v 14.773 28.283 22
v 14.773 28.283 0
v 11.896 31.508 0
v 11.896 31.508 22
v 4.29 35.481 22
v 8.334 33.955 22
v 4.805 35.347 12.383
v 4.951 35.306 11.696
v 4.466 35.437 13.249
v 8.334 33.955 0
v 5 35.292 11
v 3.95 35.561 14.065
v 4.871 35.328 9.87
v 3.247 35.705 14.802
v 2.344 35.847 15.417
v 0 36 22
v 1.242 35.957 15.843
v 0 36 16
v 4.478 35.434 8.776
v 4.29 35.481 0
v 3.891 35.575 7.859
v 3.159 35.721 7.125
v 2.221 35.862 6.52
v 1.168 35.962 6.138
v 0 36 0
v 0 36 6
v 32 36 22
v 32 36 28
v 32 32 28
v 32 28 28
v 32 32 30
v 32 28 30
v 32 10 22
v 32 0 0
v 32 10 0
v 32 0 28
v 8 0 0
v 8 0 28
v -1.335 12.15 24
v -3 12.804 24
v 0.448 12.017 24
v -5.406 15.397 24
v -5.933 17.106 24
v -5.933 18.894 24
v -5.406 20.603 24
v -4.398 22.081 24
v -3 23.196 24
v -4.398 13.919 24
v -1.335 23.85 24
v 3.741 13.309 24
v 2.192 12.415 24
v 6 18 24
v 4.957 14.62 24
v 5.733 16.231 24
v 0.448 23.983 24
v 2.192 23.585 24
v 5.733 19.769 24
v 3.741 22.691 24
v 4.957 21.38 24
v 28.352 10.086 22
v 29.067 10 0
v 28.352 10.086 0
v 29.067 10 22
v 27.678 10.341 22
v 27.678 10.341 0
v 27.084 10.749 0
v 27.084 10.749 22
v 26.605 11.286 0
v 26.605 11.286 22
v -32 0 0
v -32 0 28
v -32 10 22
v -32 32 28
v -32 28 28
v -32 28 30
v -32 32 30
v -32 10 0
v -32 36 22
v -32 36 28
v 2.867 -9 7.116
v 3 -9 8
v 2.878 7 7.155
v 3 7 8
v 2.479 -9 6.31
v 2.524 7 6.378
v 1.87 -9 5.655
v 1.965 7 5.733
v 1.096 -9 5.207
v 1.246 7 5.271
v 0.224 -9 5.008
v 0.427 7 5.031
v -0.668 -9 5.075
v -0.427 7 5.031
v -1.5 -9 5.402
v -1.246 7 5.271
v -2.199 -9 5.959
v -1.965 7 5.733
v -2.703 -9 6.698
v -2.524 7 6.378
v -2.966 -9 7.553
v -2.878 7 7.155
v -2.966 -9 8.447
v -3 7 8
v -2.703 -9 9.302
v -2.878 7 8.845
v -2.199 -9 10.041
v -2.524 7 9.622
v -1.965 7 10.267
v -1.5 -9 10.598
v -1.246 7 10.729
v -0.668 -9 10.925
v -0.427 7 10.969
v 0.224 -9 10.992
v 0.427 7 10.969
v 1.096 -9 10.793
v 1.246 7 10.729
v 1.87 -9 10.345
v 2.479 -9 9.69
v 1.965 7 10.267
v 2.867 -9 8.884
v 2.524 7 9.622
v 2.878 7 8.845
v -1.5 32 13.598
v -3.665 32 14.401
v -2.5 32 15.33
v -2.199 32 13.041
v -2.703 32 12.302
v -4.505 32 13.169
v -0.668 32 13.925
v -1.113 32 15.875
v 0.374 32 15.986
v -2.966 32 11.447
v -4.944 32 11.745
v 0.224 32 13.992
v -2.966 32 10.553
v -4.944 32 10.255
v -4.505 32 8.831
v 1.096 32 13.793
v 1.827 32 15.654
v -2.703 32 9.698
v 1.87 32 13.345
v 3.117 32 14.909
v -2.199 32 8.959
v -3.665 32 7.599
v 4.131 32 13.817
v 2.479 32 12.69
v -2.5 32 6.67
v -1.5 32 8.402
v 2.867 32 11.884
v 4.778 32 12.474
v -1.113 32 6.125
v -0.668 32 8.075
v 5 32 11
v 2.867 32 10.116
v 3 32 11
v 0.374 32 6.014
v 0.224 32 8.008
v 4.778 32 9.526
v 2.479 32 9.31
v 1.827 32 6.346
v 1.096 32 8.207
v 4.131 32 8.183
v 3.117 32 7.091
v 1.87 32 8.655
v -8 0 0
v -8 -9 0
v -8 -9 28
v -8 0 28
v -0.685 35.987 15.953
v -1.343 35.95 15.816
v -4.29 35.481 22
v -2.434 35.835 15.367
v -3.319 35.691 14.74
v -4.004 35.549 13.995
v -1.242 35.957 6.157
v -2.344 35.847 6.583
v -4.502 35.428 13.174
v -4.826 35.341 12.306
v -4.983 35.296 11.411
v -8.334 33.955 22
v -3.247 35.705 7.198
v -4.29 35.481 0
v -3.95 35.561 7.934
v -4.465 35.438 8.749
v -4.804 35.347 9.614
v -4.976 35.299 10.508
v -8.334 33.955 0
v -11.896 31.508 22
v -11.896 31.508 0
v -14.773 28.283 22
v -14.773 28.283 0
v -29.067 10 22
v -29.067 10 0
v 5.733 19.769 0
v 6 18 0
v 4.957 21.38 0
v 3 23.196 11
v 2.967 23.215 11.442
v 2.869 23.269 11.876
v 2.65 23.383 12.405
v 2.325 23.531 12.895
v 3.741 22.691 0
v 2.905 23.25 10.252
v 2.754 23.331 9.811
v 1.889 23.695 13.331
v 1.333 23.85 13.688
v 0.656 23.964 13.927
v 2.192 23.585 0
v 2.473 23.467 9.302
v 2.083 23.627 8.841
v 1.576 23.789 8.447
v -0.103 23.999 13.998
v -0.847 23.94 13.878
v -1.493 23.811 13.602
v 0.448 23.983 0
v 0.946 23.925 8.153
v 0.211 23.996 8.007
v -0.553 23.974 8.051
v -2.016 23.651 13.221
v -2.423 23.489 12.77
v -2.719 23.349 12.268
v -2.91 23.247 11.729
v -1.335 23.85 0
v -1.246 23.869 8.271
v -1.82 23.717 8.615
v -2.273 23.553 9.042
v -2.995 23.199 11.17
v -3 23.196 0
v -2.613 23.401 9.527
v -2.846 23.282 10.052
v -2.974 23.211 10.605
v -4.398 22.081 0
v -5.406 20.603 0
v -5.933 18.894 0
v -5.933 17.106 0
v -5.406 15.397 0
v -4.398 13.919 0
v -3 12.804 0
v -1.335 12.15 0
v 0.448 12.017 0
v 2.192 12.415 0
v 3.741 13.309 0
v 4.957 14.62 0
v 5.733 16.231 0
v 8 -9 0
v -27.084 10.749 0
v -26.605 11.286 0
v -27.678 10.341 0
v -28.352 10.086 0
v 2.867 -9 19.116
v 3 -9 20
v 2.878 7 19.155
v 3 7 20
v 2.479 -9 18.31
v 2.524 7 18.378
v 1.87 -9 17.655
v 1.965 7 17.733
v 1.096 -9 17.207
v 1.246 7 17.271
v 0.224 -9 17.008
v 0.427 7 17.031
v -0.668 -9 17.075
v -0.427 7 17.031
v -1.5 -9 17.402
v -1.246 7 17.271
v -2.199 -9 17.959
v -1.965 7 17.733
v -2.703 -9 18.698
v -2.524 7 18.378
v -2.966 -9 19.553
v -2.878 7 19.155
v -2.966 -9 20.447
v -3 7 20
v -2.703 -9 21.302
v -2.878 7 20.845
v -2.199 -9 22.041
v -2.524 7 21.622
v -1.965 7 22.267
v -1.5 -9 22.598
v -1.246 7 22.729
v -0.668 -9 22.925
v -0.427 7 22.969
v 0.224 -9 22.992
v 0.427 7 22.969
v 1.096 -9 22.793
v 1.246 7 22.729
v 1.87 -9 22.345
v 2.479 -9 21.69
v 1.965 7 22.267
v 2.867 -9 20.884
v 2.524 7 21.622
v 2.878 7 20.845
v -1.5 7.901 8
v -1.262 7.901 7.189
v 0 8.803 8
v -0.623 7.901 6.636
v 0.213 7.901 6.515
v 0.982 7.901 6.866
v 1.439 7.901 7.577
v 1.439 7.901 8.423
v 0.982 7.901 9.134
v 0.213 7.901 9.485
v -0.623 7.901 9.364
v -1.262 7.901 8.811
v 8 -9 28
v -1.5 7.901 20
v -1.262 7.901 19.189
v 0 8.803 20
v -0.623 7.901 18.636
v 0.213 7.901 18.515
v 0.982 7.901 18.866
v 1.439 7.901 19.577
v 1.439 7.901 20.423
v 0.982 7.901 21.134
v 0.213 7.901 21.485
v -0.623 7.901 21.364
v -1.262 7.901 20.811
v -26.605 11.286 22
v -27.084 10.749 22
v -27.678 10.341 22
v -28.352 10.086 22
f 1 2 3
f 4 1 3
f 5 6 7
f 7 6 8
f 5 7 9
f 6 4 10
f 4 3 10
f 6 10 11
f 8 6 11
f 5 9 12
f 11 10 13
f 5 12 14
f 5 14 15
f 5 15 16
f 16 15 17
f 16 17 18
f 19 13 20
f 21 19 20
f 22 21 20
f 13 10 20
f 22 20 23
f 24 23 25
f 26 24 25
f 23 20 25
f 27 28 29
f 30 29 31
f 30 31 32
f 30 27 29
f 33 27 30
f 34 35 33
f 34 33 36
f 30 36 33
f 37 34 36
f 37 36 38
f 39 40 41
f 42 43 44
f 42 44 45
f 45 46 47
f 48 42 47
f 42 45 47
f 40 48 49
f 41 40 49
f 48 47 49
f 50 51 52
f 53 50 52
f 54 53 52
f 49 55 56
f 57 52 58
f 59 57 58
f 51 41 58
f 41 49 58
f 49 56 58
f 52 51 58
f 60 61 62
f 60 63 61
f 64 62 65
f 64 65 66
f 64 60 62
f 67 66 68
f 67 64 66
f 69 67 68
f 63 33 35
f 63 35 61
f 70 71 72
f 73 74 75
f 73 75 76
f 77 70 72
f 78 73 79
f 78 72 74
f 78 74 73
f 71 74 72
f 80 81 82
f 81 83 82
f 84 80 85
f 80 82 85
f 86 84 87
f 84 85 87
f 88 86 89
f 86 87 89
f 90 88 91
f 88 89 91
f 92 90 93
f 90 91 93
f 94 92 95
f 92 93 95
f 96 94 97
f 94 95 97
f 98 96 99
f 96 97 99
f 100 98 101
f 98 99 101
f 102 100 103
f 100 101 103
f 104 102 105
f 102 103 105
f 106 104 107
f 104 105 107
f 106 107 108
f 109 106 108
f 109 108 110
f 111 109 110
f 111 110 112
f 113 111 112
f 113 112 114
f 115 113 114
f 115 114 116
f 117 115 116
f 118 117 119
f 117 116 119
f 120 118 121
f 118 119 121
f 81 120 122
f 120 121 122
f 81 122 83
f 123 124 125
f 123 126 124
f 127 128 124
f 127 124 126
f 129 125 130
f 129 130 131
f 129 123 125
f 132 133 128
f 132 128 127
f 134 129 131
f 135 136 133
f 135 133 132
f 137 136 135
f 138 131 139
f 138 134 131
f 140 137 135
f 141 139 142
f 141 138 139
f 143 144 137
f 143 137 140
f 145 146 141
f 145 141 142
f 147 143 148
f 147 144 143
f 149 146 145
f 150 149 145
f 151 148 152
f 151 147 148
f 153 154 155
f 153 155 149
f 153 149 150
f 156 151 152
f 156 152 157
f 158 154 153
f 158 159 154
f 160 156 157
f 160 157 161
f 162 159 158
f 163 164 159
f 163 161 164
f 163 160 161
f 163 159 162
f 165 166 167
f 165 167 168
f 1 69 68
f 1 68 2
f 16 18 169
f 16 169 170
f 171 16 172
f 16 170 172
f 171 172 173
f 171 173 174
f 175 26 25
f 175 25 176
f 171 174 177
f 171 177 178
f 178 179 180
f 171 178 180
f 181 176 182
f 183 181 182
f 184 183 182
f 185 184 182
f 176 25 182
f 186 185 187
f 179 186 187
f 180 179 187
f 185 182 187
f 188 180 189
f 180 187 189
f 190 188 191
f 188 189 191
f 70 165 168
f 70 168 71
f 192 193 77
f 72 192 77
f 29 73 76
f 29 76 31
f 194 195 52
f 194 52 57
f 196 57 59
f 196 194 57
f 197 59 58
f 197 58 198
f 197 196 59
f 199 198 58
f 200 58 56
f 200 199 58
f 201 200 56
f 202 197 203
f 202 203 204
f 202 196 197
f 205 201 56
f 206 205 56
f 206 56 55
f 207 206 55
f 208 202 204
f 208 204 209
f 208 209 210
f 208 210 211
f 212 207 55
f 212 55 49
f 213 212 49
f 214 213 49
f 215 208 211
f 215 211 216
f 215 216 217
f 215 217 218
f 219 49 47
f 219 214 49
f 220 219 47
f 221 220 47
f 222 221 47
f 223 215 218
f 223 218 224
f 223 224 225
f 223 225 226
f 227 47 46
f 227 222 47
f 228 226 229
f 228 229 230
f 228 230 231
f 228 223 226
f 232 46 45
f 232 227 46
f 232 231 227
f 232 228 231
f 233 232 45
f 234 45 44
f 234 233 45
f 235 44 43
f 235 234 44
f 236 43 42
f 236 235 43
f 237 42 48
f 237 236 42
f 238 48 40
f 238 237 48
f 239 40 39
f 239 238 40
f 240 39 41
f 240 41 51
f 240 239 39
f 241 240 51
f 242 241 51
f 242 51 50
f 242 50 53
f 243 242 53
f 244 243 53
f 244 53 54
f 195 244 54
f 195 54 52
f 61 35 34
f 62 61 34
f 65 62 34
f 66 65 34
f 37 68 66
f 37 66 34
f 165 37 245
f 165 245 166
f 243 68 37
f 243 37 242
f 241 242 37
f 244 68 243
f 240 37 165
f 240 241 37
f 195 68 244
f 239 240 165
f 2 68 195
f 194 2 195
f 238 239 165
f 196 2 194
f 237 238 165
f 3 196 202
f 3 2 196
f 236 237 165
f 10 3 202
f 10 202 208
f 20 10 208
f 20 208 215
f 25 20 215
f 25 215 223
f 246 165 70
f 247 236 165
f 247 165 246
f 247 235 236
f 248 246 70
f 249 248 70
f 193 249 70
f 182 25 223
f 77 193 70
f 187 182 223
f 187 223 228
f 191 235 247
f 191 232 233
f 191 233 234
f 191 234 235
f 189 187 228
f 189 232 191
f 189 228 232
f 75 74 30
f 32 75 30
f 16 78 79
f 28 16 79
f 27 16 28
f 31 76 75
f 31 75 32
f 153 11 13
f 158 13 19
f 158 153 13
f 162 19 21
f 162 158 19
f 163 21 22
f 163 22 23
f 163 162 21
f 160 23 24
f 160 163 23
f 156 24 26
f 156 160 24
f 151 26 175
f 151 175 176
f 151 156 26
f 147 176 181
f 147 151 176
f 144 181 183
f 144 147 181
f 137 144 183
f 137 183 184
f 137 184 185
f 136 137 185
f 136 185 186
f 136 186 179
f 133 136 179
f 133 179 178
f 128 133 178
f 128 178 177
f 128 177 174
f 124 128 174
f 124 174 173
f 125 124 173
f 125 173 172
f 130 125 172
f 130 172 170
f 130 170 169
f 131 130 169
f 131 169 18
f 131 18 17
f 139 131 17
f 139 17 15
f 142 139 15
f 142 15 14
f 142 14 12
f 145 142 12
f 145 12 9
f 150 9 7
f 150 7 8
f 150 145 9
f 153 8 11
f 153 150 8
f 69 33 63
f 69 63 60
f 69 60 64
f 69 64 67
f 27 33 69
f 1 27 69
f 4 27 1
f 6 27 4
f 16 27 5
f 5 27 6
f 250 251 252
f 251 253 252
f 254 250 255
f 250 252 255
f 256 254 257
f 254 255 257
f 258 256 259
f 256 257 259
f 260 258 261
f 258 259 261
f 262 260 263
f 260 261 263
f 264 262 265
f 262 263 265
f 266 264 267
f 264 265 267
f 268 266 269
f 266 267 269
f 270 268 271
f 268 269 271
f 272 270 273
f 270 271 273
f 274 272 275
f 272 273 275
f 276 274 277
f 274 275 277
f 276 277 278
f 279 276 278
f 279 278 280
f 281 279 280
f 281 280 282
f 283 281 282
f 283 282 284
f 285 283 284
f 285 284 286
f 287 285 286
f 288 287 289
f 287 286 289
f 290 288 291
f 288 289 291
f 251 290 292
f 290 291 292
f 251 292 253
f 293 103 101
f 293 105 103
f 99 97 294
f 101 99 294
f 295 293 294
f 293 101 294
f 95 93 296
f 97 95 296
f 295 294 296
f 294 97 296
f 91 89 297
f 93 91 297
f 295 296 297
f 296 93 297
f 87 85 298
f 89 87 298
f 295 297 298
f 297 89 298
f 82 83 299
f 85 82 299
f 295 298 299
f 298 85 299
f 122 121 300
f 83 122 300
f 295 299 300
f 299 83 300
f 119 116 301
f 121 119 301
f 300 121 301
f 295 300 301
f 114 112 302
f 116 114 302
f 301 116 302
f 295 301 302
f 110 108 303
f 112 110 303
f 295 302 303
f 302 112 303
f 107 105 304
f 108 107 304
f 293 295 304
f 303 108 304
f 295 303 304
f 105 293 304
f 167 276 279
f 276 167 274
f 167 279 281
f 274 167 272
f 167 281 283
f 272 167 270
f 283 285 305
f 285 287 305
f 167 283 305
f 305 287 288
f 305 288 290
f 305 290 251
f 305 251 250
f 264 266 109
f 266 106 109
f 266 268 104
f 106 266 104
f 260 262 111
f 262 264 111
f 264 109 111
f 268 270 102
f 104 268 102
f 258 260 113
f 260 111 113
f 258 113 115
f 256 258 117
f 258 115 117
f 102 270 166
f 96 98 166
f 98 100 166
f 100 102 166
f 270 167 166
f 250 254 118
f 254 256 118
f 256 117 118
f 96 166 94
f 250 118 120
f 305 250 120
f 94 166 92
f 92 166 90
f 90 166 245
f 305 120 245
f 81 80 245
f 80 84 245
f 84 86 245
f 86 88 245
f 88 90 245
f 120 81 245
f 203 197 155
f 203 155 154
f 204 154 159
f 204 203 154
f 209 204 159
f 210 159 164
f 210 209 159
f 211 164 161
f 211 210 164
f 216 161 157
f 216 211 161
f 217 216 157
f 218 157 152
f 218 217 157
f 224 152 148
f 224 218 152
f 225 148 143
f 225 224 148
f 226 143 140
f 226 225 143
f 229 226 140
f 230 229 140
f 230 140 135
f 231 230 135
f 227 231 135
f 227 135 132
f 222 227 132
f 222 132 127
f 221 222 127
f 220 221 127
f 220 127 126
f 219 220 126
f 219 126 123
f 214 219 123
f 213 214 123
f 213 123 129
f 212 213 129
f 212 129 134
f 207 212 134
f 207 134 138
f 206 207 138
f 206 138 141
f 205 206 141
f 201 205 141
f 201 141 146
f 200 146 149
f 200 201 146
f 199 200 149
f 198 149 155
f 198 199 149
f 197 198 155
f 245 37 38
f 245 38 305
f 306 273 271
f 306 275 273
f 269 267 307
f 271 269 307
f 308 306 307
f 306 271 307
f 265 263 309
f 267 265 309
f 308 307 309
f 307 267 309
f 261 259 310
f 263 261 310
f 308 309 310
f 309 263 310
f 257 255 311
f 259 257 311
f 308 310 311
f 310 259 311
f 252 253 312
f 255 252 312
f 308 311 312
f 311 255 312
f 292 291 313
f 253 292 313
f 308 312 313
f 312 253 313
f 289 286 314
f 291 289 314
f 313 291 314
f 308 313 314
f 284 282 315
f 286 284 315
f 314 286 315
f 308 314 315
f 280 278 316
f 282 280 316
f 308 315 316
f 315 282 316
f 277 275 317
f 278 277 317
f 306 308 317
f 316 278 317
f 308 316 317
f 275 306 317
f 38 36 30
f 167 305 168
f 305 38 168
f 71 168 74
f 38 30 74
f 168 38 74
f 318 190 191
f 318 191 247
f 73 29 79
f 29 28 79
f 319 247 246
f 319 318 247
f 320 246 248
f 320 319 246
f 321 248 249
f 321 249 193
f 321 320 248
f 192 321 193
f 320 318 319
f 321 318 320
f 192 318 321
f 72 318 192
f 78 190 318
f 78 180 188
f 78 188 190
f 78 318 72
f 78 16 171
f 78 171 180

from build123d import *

# Parameters (mm, degrees)
BOSS_EXTRUDE2_DEPTH       = 28
SKETCH5_R                 = 6
CUT_EXTRUDE1_DEPTH        = 24
CUT_EXTRUDE3_DEPTH        = 22
HOLE1_START               = 23.196151292
HOLE1_OUTLINE_R           = 3
HOLE1_DEPTH               = 12.803848708
HOLE1_START_2             = 32
HOLE1_2_OUTLINE_R         = 5
HOLE1_2_OUTLINE_R_2       = 3
HOLE1_2_DEPTH             = 4
F_6_0MM_DOWEL_HOLE2_D     = 6
F_6_0MM_DOWEL_HOLE2_DEPTH = 16
F_6_0MM_DOWEL_HOLE2_TIP   = 1.802581857
FILLET1_R                 = 3
SKETCH19_W                = 64
SKETCH19_H                = 4
BOSS_EXTRUDE3_DEPTH       = 2


# Read off the part's stored shape, not the designer's step: Hole1
with BuildPart() as part:
    # Sketch2 → Boss-Extrude2 (new body)
    with BuildSketch(Plane.XY):
        Polygon((0, -9), (-8, -9), (-8, 0), (-32, 0), (-32, 36), (32, 36), (32, 0), (8, 0), (8, -9), align=None)
    extrude(amount=BOSS_EXTRUDE2_DEPTH)

    # Sketch5 → Cut-Extrude1 (cut)
    with BuildSketch(Plane.XY):
        with Locations((0, 18)):
            Circle(SKETCH5_R)
    extrude(amount=CUT_EXTRUDE1_DEPTH, mode=Mode.SUBTRACT)

    # Sketch6 → Cut-Extrude3 (cut)
    with BuildSketch(Plane(origin=(0, 0, 0), x_dir=(-1, 0, 0), z_dir=(0, 0, -1))):
        with BuildLine():
            Line((-32, 36), (-32, 10))
            Line((-32, 10), (-27.5, 10))
            Line((-27.5, 10), (-14.77335007, 28.283390866))
            ThreePointArc((-14.77335007, 28.283390866), (-8.333635583, 33.954639387), (2.5e-08, 36))
            Line((2.5e-08, 36), (-32, 36))
        make_face()
        with BuildLine():
            Line((32, 36), (2.5e-08, 36))
            ThreePointArc((2.5e-08, 36), (8.333635604, 33.954639376), (14.77335007, 28.283390866))
            Line((14.77335007, 28.283390866), (27.5, 10))
            Line((27.5, 10), (32, 10))
            Line((32, 10), (32, 36))
        make_face()
    extrude(amount=-CUT_EXTRUDE3_DEPTH, mode=Mode.SUBTRACT)

    # Hole1 outline → Hole1 (cut)
    with BuildSketch(Plane(origin=(0, 0, 0), x_dir=(1, 0, 0), z_dir=(0, 1, 0)).offset(HOLE1_START)):
        with Locations((0, -11)):
            Circle(HOLE1_OUTLINE_R)
    extrude(amount=HOLE1_DEPTH, mode=Mode.SUBTRACT)

    # Hole1 2 outline → Hole1 2 (cut)
    with BuildSketch(Plane(origin=(0, 0, 0), x_dir=(1, 0, 0), z_dir=(0, 1, 0)).offset(HOLE1_START_2)):
        with Locations((0, -11)):
            Circle(HOLE1_2_OUTLINE_R)
        with Locations((0, -11)):
            Circle(HOLE1_2_OUTLINE_R_2, mode=Mode.SUBTRACT)
    extrude(amount=HOLE1_2_DEPTH, mode=Mode.SUBTRACT)

    # Ø6.0mm Dowel Hole2
    with Locations(Plane(origin=(0, -9, 0), x_dir=(-1, 0, 0), z_dir=(0, -1, 0))):
        with Locations((0, -20), (0, -8)):
            Hole(F_6_0MM_DOWEL_HOLE2_D / 2, depth=F_6_0MM_DOWEL_HOLE2_DEPTH)
            with Locations((0, 0, -(F_6_0MM_DOWEL_HOLE2_DEPTH + F_6_0MM_DOWEL_HOLE2_TIP / 2))):  # 118° drill point
                Cone(0, F_6_0MM_DOWEL_HOLE2_D / 2, F_6_0MM_DOWEL_HOLE2_TIP, mode=Mode.SUBTRACT)

    # Fillet1
    fillet1_edges = [part.edges().sort_by_distance(p)[0] for p in [
        (27.5, 10, 11),
        (-27.5, 10, 11),
    ]]
    fillet(fillet1_edges, radius=FILLET1_R)

    # Sketch19 → Boss-Extrude3 (add)
    with BuildSketch(Plane.XY.offset(28)):
        with Locations((0, 30)):
            Rectangle(SKETCH19_W, SKETCH19_H)
    extrude(amount=BOSS_EXTRUDE3_DEPTH)


solid = part.part
